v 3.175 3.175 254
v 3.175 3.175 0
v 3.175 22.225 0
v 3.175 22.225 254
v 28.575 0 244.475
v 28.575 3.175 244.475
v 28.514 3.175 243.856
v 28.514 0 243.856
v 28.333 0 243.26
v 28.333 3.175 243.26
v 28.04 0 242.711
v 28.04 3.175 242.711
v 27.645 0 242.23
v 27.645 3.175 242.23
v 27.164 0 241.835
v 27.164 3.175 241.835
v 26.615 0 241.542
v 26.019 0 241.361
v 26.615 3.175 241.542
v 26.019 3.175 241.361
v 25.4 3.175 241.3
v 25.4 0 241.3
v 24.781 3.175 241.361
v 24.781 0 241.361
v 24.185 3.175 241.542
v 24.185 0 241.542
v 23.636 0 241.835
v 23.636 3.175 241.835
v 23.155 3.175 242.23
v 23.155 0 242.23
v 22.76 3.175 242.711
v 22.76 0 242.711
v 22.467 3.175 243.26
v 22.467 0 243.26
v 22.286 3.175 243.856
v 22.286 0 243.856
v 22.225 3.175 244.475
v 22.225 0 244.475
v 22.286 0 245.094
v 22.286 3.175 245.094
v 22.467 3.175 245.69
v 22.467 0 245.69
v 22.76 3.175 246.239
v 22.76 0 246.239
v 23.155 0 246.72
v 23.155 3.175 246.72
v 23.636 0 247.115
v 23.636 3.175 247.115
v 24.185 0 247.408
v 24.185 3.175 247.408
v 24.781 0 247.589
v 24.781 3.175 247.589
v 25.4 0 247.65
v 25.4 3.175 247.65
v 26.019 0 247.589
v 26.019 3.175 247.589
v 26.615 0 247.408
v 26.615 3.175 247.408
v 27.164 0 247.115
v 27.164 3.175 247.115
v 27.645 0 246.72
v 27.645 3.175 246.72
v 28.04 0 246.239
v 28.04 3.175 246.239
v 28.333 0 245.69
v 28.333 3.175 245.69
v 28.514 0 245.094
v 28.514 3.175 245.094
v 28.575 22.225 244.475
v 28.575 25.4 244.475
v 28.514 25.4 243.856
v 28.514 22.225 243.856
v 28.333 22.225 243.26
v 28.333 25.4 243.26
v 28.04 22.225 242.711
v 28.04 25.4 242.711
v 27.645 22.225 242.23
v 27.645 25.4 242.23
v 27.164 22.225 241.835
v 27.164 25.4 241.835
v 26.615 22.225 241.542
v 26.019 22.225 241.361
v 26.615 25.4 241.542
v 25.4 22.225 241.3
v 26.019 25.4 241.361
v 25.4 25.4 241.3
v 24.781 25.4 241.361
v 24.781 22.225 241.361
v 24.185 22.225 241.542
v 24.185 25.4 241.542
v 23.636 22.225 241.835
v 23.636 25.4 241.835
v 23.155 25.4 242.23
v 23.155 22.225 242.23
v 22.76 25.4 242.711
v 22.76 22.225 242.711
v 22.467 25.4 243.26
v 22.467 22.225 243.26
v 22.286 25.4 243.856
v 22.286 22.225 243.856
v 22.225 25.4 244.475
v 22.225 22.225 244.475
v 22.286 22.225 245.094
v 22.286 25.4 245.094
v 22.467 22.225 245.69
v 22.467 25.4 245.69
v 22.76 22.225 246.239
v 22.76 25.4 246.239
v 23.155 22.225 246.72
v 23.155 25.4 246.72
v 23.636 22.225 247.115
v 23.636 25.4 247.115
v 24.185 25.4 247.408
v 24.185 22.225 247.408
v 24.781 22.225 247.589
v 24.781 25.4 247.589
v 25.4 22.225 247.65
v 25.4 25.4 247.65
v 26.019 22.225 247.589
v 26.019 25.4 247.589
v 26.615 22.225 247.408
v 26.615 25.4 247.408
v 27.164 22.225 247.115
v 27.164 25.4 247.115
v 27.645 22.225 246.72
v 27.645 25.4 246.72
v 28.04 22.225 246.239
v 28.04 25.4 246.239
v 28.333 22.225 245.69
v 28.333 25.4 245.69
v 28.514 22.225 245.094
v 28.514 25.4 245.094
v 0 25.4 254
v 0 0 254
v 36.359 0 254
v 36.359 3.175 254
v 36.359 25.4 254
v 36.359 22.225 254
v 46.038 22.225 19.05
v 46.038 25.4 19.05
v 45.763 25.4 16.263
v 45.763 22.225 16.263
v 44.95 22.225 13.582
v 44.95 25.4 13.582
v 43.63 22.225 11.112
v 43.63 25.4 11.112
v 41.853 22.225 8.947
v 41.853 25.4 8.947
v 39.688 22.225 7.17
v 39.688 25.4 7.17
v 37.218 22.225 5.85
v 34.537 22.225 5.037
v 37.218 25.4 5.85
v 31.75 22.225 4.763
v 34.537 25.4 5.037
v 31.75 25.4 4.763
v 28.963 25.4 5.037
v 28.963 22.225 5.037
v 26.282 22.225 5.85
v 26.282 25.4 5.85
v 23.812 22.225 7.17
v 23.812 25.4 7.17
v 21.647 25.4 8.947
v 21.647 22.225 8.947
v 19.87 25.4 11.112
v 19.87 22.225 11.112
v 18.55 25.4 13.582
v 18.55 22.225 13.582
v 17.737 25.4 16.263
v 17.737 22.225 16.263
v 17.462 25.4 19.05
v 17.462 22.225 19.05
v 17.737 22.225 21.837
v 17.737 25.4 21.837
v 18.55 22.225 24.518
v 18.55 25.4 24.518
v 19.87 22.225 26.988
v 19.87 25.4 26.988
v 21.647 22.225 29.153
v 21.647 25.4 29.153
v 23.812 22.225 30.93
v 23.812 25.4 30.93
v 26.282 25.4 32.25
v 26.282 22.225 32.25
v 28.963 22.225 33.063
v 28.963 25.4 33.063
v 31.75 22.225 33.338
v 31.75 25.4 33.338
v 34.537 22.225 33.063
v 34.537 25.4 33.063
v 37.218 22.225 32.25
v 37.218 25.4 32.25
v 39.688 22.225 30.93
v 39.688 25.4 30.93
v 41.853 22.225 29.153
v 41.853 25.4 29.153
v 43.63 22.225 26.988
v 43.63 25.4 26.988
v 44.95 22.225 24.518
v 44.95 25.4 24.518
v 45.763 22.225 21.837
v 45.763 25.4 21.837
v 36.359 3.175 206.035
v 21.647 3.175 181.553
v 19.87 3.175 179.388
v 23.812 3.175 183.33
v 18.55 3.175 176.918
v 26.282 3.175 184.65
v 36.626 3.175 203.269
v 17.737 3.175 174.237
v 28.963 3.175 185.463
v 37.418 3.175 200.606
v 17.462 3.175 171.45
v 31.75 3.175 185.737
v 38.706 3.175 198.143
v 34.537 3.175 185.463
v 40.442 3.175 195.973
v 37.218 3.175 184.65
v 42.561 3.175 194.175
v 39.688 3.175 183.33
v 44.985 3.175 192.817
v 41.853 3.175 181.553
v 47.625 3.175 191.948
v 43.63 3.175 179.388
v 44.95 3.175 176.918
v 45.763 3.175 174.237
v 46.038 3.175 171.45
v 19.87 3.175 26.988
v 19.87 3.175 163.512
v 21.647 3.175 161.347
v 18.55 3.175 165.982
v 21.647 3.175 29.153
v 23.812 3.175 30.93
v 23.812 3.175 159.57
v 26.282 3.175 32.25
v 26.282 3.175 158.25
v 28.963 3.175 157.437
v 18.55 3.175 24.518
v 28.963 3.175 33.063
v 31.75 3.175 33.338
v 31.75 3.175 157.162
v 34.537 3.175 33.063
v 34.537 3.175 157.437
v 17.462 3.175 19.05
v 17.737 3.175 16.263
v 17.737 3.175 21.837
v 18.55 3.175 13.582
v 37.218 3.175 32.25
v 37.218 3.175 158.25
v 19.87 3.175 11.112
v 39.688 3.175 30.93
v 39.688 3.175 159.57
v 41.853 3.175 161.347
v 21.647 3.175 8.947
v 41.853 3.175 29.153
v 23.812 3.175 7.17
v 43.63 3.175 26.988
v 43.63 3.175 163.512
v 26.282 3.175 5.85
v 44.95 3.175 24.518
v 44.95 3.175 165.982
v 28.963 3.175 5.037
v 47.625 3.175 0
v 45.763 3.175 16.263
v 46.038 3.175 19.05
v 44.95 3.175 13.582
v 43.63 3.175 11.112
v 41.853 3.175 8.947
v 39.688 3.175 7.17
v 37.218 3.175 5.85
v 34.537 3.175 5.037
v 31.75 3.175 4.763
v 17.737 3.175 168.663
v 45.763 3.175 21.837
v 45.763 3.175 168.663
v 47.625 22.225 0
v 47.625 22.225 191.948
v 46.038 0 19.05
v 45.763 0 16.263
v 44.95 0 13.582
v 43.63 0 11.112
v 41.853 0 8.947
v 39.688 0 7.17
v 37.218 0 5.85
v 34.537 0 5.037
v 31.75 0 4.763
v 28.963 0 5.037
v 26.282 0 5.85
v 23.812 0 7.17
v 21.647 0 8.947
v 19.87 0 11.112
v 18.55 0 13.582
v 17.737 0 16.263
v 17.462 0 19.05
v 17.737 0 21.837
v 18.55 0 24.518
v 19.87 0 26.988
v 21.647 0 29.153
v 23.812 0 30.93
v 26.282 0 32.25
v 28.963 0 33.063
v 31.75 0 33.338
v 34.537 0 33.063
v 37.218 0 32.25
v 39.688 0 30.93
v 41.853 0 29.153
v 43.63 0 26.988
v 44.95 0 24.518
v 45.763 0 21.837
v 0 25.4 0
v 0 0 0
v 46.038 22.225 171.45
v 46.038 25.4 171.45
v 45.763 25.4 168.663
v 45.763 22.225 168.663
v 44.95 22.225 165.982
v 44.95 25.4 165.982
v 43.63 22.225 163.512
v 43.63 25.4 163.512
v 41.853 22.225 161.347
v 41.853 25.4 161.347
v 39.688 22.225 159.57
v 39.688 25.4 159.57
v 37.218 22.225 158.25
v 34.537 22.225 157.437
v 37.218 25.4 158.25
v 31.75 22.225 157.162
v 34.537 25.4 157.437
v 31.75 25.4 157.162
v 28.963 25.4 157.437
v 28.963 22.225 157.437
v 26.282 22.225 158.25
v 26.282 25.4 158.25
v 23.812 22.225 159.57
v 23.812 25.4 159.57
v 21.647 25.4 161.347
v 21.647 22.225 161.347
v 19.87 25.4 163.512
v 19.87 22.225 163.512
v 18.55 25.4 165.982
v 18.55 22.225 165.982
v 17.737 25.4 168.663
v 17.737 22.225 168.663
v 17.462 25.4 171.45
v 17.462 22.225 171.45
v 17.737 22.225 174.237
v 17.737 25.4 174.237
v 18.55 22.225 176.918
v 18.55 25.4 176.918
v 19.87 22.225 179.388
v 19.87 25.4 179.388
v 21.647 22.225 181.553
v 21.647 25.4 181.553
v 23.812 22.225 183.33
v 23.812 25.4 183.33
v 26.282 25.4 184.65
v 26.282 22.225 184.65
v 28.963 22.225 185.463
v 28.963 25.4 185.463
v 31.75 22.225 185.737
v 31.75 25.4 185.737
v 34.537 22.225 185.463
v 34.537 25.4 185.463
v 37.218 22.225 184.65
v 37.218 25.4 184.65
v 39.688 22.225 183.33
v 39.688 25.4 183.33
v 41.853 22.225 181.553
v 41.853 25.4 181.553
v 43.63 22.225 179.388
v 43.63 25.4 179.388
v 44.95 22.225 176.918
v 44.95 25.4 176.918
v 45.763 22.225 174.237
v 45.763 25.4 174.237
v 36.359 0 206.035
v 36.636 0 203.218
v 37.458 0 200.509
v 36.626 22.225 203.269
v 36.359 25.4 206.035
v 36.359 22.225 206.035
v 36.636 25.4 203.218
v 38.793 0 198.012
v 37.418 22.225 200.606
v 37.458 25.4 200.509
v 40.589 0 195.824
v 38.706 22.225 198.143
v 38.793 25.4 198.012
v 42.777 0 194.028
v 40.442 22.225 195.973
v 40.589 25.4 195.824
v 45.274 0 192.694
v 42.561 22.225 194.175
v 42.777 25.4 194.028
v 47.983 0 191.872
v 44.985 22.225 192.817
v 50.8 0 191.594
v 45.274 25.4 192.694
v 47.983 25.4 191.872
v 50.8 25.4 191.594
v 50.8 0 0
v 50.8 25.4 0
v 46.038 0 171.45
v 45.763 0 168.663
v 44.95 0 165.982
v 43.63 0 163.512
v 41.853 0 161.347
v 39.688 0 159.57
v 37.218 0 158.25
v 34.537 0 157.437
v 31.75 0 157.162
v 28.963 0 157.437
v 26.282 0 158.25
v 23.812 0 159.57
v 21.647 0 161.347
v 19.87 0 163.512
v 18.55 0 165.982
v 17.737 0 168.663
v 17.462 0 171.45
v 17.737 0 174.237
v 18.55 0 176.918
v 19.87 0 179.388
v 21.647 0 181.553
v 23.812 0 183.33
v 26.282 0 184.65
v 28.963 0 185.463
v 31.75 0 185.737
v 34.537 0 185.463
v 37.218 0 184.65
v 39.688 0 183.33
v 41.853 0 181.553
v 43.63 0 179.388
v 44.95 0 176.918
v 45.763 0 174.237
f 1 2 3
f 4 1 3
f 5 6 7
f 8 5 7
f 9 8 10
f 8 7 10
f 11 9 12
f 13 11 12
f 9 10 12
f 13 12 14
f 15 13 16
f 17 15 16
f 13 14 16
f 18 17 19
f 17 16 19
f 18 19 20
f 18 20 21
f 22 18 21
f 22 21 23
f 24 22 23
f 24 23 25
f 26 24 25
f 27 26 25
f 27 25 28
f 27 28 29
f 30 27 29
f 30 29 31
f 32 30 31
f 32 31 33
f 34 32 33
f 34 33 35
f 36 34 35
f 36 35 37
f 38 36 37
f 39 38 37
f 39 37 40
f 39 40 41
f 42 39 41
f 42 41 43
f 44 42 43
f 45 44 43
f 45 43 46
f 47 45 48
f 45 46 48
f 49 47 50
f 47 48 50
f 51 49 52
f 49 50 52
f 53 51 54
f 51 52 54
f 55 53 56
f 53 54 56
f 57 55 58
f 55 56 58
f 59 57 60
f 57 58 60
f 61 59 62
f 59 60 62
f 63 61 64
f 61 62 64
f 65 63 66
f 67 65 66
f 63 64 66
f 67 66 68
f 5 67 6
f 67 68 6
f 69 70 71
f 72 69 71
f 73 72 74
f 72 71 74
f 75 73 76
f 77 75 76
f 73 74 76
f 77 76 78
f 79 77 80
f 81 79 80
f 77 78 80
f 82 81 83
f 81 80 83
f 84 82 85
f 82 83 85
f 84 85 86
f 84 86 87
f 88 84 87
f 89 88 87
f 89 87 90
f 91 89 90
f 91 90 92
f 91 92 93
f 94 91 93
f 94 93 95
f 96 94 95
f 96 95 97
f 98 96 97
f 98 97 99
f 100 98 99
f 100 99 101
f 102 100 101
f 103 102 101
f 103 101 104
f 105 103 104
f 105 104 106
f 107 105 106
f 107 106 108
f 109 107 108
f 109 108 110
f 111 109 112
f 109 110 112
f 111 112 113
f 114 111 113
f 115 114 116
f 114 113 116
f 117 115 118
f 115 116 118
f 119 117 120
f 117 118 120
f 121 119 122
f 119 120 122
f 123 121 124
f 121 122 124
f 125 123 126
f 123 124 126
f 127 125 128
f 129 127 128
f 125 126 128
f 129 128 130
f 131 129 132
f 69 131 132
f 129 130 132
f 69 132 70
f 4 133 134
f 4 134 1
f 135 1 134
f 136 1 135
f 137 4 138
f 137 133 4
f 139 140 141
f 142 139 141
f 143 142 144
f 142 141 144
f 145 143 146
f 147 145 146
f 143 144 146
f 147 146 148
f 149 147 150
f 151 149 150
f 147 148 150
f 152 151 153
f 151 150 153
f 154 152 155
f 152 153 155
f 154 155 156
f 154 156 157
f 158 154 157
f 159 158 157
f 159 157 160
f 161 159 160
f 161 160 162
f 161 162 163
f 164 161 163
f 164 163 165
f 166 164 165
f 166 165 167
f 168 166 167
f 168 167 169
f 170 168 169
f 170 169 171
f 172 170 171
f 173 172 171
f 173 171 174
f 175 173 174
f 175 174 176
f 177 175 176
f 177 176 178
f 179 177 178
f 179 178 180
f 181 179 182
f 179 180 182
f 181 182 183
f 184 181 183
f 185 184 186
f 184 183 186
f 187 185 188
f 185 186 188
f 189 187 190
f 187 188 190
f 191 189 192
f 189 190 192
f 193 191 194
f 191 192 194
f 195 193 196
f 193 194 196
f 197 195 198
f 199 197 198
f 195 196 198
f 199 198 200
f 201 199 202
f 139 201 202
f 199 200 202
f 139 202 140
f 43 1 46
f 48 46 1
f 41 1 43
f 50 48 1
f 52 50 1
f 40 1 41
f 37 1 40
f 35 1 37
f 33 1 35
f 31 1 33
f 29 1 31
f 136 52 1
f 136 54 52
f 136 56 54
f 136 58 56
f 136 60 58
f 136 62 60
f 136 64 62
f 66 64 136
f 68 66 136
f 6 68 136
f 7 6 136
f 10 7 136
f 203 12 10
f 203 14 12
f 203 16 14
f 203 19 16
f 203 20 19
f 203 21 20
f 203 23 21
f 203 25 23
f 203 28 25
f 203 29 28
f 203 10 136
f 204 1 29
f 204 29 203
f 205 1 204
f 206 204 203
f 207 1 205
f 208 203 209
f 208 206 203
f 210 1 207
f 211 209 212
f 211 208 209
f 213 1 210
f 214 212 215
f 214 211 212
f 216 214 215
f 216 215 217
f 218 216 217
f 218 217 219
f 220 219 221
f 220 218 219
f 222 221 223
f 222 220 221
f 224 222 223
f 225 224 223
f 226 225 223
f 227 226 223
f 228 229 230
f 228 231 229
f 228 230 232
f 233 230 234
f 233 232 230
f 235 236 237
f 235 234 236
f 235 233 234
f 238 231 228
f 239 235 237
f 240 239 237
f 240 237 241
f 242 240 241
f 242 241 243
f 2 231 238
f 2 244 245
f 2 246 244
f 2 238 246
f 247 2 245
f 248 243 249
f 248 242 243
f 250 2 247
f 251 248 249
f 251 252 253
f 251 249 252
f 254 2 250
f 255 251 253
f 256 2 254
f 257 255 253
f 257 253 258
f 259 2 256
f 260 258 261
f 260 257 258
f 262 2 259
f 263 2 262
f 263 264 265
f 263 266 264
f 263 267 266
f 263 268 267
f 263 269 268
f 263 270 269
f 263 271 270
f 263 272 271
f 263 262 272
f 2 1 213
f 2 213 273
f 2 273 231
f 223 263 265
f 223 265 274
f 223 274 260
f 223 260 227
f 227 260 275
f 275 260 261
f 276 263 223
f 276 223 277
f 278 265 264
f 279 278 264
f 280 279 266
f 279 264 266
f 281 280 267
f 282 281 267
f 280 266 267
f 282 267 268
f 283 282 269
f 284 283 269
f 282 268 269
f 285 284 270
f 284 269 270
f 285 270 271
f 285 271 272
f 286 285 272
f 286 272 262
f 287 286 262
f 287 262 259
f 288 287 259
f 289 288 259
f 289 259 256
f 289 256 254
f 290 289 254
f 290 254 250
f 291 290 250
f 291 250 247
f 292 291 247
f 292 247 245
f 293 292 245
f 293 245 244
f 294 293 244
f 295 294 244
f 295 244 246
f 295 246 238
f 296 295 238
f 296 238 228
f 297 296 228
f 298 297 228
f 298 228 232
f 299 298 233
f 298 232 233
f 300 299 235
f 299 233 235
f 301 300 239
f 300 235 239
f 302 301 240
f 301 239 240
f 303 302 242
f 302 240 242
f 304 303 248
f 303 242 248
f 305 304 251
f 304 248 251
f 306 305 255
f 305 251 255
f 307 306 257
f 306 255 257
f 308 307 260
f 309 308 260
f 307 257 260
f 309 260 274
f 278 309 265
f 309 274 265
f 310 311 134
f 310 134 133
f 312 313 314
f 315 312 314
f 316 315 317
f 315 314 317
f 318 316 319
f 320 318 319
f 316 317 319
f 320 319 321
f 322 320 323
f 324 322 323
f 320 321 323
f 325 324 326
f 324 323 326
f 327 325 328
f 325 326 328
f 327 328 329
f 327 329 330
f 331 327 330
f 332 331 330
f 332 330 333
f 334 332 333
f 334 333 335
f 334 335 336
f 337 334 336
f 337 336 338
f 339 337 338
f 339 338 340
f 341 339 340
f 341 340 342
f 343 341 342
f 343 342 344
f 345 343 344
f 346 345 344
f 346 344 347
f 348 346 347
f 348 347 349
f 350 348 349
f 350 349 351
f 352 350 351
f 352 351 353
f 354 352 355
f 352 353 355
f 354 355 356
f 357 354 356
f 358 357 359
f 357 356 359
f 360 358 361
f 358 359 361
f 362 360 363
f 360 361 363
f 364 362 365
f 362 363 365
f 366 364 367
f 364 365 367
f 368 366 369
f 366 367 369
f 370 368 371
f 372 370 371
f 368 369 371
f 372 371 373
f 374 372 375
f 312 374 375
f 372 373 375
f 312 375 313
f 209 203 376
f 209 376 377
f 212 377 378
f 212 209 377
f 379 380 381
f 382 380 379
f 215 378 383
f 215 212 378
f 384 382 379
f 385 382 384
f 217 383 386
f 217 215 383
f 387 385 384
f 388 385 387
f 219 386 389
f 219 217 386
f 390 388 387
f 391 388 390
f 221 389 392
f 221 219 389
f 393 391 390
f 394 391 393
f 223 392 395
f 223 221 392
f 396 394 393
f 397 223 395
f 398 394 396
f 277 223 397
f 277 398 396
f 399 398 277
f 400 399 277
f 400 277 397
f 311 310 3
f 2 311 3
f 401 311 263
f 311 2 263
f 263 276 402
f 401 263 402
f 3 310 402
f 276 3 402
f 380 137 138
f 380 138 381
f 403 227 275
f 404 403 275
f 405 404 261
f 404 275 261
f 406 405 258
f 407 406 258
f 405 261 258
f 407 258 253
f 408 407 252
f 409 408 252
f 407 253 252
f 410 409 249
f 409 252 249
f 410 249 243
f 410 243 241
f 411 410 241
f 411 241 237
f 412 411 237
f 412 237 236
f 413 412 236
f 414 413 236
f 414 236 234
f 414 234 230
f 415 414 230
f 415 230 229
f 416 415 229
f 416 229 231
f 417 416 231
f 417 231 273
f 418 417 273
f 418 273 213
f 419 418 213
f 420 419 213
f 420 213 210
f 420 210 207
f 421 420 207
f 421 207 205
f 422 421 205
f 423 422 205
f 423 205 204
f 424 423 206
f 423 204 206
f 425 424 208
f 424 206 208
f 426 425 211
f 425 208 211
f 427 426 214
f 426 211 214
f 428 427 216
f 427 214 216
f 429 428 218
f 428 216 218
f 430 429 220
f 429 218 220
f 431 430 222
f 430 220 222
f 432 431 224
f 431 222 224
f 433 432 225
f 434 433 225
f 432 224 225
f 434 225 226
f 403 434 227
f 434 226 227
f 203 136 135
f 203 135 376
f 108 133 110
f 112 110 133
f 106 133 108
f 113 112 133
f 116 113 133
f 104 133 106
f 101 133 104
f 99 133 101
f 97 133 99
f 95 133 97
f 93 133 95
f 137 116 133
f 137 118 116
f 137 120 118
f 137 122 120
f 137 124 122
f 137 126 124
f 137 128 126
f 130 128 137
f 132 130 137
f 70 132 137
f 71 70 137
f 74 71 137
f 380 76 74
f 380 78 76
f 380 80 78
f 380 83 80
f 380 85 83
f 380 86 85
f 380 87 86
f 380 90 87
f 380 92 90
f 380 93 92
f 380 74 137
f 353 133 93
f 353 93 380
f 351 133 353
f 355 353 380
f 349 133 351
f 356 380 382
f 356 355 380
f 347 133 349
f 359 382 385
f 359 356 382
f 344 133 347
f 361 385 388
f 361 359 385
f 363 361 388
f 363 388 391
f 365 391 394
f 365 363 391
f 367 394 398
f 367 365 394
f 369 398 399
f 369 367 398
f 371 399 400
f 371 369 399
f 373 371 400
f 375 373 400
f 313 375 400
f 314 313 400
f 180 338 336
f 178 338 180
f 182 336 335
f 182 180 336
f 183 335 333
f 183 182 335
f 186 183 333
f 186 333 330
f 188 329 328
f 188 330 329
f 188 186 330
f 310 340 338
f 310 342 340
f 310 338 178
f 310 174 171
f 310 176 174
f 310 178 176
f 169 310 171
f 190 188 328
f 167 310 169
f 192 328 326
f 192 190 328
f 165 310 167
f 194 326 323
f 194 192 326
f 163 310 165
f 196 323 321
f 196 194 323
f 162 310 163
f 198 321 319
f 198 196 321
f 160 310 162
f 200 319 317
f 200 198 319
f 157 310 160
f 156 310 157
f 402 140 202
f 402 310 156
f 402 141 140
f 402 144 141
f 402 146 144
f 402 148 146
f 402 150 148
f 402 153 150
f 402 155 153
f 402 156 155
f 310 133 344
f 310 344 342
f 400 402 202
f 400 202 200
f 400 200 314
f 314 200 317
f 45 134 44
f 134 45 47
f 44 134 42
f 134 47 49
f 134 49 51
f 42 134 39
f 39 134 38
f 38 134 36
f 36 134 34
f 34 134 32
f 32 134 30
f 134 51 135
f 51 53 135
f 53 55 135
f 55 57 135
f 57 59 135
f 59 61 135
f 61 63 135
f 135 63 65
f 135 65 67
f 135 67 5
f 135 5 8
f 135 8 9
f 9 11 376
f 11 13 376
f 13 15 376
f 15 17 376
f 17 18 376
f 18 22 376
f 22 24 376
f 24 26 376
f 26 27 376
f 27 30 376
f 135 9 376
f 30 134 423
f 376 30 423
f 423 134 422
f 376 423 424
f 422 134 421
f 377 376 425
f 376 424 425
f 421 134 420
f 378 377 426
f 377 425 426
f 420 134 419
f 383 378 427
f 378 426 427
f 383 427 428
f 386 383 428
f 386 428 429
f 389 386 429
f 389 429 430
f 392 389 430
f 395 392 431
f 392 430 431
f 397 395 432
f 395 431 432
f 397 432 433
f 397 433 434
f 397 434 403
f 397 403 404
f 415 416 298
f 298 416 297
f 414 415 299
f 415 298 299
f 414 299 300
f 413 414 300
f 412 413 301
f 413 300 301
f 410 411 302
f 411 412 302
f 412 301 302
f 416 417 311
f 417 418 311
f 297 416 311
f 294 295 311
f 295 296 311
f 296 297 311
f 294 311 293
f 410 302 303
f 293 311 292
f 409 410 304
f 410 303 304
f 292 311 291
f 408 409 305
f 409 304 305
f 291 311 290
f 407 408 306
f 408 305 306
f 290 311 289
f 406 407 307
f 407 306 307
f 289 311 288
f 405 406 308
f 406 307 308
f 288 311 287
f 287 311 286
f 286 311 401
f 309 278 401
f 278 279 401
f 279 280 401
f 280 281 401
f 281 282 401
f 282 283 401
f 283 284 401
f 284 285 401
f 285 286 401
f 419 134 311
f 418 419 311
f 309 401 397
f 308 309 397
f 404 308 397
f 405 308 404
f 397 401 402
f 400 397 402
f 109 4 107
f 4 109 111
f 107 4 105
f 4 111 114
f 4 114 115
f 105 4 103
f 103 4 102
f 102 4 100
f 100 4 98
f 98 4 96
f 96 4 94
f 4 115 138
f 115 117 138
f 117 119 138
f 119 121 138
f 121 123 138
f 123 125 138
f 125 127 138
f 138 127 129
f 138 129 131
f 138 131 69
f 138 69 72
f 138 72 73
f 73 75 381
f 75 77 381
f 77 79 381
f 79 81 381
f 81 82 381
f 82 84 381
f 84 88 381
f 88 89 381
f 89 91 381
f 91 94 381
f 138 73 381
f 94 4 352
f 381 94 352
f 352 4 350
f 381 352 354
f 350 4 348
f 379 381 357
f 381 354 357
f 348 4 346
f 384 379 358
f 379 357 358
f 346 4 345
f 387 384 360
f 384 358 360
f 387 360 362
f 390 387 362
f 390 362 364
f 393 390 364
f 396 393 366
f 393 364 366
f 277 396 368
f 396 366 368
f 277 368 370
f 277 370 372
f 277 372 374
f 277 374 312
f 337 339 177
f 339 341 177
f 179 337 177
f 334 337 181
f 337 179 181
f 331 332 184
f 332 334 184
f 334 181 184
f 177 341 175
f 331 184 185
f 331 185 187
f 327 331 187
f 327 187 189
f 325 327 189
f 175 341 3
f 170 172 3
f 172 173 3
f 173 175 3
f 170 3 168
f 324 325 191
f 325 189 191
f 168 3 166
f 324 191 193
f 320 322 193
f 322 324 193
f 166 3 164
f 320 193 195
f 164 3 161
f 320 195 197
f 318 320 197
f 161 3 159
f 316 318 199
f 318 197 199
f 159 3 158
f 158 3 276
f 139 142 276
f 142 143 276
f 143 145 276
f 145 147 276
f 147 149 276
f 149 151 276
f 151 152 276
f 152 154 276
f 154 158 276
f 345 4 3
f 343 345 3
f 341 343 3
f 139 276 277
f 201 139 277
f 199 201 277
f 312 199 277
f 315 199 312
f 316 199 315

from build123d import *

# Parameters (mm, degrees)
SKETCH1_W           = 50.8
SKETCH1_H           = 25.4
SKETCH1_W_2         = 44.45
SKETCH1_H_2         = 19.05
BOSS_EXTRUDE1_DEPTH = 254
SKETCH2_R           = 14.2875
CUT_EXTRUDE1_DEPTH  = 26.4
SKETCH3_R           = 3.175
CUT_EXTRUDE2_DEPTH  = 26.4
CUT_EXTRUDE3_DEPTH  = 26.4


with BuildPart() as part:
    # Sketch1 → Boss-Extrude1 (new body)
    with BuildSketch(Plane.XY):
        with Locations((25.4, 12.7)):
            Rectangle(SKETCH1_W, SKETCH1_H)
        with Locations((25.4, 12.7)):
            Rectangle(SKETCH1_W_2, SKETCH1_H_2, mode=Mode.SUBTRACT)
    extrude(amount=BOSS_EXTRUDE1_DEPTH)

    # Sketch2 → Cut-Extrude1 (cut, through all)
    with BuildSketch(Plane(origin=(0, 25.4, 0), x_dir=(1, 0, 0), z_dir=(0, 1, 0))):
        with Locations((31.75, -19.05)):
            Circle(SKETCH2_R)
        with Locations((31.75, -171.45)):
            Circle(SKETCH2_R)
    extrude(amount=-CUT_EXTRUDE1_DEPTH, mode=Mode.SUBTRACT)

    # Sketch3 → Cut-Extrude2 (cut, through all)
    with BuildSketch(Plane(origin=(0, 25.4, 0), x_dir=(1, 0, 0), z_dir=(0, 1, 0))):
        with Locations((25.4, -244.475)):
            Circle(SKETCH3_R)
    extrude(amount=-CUT_EXTRUDE2_DEPTH, mode=Mode.SUBTRACT)

    # Sketch4 → Cut-Extrude3 (cut, through all)
    with BuildSketch(Plane(origin=(0, 25.4, 0), x_dir=(1, 0, 0), z_dir=(0, 1, 0))):
        with BuildLine():
            Line((36.358855328, -254), (36.358855328, -206.035443665))
            ThreePointArc((36.358855328, -206.035443665), (40.588568674, -195.824012339), (50.8, -191.594298992))
            Line((50.8, -191.594298992), (50.8, -254))
            Line((50.8, -254), (36.358855328, -254))
        make_face()
    extrude(amount=-CUT_EXTRUDE3_DEPTH, mode=Mode.SUBTRACT)


solid = part.part
